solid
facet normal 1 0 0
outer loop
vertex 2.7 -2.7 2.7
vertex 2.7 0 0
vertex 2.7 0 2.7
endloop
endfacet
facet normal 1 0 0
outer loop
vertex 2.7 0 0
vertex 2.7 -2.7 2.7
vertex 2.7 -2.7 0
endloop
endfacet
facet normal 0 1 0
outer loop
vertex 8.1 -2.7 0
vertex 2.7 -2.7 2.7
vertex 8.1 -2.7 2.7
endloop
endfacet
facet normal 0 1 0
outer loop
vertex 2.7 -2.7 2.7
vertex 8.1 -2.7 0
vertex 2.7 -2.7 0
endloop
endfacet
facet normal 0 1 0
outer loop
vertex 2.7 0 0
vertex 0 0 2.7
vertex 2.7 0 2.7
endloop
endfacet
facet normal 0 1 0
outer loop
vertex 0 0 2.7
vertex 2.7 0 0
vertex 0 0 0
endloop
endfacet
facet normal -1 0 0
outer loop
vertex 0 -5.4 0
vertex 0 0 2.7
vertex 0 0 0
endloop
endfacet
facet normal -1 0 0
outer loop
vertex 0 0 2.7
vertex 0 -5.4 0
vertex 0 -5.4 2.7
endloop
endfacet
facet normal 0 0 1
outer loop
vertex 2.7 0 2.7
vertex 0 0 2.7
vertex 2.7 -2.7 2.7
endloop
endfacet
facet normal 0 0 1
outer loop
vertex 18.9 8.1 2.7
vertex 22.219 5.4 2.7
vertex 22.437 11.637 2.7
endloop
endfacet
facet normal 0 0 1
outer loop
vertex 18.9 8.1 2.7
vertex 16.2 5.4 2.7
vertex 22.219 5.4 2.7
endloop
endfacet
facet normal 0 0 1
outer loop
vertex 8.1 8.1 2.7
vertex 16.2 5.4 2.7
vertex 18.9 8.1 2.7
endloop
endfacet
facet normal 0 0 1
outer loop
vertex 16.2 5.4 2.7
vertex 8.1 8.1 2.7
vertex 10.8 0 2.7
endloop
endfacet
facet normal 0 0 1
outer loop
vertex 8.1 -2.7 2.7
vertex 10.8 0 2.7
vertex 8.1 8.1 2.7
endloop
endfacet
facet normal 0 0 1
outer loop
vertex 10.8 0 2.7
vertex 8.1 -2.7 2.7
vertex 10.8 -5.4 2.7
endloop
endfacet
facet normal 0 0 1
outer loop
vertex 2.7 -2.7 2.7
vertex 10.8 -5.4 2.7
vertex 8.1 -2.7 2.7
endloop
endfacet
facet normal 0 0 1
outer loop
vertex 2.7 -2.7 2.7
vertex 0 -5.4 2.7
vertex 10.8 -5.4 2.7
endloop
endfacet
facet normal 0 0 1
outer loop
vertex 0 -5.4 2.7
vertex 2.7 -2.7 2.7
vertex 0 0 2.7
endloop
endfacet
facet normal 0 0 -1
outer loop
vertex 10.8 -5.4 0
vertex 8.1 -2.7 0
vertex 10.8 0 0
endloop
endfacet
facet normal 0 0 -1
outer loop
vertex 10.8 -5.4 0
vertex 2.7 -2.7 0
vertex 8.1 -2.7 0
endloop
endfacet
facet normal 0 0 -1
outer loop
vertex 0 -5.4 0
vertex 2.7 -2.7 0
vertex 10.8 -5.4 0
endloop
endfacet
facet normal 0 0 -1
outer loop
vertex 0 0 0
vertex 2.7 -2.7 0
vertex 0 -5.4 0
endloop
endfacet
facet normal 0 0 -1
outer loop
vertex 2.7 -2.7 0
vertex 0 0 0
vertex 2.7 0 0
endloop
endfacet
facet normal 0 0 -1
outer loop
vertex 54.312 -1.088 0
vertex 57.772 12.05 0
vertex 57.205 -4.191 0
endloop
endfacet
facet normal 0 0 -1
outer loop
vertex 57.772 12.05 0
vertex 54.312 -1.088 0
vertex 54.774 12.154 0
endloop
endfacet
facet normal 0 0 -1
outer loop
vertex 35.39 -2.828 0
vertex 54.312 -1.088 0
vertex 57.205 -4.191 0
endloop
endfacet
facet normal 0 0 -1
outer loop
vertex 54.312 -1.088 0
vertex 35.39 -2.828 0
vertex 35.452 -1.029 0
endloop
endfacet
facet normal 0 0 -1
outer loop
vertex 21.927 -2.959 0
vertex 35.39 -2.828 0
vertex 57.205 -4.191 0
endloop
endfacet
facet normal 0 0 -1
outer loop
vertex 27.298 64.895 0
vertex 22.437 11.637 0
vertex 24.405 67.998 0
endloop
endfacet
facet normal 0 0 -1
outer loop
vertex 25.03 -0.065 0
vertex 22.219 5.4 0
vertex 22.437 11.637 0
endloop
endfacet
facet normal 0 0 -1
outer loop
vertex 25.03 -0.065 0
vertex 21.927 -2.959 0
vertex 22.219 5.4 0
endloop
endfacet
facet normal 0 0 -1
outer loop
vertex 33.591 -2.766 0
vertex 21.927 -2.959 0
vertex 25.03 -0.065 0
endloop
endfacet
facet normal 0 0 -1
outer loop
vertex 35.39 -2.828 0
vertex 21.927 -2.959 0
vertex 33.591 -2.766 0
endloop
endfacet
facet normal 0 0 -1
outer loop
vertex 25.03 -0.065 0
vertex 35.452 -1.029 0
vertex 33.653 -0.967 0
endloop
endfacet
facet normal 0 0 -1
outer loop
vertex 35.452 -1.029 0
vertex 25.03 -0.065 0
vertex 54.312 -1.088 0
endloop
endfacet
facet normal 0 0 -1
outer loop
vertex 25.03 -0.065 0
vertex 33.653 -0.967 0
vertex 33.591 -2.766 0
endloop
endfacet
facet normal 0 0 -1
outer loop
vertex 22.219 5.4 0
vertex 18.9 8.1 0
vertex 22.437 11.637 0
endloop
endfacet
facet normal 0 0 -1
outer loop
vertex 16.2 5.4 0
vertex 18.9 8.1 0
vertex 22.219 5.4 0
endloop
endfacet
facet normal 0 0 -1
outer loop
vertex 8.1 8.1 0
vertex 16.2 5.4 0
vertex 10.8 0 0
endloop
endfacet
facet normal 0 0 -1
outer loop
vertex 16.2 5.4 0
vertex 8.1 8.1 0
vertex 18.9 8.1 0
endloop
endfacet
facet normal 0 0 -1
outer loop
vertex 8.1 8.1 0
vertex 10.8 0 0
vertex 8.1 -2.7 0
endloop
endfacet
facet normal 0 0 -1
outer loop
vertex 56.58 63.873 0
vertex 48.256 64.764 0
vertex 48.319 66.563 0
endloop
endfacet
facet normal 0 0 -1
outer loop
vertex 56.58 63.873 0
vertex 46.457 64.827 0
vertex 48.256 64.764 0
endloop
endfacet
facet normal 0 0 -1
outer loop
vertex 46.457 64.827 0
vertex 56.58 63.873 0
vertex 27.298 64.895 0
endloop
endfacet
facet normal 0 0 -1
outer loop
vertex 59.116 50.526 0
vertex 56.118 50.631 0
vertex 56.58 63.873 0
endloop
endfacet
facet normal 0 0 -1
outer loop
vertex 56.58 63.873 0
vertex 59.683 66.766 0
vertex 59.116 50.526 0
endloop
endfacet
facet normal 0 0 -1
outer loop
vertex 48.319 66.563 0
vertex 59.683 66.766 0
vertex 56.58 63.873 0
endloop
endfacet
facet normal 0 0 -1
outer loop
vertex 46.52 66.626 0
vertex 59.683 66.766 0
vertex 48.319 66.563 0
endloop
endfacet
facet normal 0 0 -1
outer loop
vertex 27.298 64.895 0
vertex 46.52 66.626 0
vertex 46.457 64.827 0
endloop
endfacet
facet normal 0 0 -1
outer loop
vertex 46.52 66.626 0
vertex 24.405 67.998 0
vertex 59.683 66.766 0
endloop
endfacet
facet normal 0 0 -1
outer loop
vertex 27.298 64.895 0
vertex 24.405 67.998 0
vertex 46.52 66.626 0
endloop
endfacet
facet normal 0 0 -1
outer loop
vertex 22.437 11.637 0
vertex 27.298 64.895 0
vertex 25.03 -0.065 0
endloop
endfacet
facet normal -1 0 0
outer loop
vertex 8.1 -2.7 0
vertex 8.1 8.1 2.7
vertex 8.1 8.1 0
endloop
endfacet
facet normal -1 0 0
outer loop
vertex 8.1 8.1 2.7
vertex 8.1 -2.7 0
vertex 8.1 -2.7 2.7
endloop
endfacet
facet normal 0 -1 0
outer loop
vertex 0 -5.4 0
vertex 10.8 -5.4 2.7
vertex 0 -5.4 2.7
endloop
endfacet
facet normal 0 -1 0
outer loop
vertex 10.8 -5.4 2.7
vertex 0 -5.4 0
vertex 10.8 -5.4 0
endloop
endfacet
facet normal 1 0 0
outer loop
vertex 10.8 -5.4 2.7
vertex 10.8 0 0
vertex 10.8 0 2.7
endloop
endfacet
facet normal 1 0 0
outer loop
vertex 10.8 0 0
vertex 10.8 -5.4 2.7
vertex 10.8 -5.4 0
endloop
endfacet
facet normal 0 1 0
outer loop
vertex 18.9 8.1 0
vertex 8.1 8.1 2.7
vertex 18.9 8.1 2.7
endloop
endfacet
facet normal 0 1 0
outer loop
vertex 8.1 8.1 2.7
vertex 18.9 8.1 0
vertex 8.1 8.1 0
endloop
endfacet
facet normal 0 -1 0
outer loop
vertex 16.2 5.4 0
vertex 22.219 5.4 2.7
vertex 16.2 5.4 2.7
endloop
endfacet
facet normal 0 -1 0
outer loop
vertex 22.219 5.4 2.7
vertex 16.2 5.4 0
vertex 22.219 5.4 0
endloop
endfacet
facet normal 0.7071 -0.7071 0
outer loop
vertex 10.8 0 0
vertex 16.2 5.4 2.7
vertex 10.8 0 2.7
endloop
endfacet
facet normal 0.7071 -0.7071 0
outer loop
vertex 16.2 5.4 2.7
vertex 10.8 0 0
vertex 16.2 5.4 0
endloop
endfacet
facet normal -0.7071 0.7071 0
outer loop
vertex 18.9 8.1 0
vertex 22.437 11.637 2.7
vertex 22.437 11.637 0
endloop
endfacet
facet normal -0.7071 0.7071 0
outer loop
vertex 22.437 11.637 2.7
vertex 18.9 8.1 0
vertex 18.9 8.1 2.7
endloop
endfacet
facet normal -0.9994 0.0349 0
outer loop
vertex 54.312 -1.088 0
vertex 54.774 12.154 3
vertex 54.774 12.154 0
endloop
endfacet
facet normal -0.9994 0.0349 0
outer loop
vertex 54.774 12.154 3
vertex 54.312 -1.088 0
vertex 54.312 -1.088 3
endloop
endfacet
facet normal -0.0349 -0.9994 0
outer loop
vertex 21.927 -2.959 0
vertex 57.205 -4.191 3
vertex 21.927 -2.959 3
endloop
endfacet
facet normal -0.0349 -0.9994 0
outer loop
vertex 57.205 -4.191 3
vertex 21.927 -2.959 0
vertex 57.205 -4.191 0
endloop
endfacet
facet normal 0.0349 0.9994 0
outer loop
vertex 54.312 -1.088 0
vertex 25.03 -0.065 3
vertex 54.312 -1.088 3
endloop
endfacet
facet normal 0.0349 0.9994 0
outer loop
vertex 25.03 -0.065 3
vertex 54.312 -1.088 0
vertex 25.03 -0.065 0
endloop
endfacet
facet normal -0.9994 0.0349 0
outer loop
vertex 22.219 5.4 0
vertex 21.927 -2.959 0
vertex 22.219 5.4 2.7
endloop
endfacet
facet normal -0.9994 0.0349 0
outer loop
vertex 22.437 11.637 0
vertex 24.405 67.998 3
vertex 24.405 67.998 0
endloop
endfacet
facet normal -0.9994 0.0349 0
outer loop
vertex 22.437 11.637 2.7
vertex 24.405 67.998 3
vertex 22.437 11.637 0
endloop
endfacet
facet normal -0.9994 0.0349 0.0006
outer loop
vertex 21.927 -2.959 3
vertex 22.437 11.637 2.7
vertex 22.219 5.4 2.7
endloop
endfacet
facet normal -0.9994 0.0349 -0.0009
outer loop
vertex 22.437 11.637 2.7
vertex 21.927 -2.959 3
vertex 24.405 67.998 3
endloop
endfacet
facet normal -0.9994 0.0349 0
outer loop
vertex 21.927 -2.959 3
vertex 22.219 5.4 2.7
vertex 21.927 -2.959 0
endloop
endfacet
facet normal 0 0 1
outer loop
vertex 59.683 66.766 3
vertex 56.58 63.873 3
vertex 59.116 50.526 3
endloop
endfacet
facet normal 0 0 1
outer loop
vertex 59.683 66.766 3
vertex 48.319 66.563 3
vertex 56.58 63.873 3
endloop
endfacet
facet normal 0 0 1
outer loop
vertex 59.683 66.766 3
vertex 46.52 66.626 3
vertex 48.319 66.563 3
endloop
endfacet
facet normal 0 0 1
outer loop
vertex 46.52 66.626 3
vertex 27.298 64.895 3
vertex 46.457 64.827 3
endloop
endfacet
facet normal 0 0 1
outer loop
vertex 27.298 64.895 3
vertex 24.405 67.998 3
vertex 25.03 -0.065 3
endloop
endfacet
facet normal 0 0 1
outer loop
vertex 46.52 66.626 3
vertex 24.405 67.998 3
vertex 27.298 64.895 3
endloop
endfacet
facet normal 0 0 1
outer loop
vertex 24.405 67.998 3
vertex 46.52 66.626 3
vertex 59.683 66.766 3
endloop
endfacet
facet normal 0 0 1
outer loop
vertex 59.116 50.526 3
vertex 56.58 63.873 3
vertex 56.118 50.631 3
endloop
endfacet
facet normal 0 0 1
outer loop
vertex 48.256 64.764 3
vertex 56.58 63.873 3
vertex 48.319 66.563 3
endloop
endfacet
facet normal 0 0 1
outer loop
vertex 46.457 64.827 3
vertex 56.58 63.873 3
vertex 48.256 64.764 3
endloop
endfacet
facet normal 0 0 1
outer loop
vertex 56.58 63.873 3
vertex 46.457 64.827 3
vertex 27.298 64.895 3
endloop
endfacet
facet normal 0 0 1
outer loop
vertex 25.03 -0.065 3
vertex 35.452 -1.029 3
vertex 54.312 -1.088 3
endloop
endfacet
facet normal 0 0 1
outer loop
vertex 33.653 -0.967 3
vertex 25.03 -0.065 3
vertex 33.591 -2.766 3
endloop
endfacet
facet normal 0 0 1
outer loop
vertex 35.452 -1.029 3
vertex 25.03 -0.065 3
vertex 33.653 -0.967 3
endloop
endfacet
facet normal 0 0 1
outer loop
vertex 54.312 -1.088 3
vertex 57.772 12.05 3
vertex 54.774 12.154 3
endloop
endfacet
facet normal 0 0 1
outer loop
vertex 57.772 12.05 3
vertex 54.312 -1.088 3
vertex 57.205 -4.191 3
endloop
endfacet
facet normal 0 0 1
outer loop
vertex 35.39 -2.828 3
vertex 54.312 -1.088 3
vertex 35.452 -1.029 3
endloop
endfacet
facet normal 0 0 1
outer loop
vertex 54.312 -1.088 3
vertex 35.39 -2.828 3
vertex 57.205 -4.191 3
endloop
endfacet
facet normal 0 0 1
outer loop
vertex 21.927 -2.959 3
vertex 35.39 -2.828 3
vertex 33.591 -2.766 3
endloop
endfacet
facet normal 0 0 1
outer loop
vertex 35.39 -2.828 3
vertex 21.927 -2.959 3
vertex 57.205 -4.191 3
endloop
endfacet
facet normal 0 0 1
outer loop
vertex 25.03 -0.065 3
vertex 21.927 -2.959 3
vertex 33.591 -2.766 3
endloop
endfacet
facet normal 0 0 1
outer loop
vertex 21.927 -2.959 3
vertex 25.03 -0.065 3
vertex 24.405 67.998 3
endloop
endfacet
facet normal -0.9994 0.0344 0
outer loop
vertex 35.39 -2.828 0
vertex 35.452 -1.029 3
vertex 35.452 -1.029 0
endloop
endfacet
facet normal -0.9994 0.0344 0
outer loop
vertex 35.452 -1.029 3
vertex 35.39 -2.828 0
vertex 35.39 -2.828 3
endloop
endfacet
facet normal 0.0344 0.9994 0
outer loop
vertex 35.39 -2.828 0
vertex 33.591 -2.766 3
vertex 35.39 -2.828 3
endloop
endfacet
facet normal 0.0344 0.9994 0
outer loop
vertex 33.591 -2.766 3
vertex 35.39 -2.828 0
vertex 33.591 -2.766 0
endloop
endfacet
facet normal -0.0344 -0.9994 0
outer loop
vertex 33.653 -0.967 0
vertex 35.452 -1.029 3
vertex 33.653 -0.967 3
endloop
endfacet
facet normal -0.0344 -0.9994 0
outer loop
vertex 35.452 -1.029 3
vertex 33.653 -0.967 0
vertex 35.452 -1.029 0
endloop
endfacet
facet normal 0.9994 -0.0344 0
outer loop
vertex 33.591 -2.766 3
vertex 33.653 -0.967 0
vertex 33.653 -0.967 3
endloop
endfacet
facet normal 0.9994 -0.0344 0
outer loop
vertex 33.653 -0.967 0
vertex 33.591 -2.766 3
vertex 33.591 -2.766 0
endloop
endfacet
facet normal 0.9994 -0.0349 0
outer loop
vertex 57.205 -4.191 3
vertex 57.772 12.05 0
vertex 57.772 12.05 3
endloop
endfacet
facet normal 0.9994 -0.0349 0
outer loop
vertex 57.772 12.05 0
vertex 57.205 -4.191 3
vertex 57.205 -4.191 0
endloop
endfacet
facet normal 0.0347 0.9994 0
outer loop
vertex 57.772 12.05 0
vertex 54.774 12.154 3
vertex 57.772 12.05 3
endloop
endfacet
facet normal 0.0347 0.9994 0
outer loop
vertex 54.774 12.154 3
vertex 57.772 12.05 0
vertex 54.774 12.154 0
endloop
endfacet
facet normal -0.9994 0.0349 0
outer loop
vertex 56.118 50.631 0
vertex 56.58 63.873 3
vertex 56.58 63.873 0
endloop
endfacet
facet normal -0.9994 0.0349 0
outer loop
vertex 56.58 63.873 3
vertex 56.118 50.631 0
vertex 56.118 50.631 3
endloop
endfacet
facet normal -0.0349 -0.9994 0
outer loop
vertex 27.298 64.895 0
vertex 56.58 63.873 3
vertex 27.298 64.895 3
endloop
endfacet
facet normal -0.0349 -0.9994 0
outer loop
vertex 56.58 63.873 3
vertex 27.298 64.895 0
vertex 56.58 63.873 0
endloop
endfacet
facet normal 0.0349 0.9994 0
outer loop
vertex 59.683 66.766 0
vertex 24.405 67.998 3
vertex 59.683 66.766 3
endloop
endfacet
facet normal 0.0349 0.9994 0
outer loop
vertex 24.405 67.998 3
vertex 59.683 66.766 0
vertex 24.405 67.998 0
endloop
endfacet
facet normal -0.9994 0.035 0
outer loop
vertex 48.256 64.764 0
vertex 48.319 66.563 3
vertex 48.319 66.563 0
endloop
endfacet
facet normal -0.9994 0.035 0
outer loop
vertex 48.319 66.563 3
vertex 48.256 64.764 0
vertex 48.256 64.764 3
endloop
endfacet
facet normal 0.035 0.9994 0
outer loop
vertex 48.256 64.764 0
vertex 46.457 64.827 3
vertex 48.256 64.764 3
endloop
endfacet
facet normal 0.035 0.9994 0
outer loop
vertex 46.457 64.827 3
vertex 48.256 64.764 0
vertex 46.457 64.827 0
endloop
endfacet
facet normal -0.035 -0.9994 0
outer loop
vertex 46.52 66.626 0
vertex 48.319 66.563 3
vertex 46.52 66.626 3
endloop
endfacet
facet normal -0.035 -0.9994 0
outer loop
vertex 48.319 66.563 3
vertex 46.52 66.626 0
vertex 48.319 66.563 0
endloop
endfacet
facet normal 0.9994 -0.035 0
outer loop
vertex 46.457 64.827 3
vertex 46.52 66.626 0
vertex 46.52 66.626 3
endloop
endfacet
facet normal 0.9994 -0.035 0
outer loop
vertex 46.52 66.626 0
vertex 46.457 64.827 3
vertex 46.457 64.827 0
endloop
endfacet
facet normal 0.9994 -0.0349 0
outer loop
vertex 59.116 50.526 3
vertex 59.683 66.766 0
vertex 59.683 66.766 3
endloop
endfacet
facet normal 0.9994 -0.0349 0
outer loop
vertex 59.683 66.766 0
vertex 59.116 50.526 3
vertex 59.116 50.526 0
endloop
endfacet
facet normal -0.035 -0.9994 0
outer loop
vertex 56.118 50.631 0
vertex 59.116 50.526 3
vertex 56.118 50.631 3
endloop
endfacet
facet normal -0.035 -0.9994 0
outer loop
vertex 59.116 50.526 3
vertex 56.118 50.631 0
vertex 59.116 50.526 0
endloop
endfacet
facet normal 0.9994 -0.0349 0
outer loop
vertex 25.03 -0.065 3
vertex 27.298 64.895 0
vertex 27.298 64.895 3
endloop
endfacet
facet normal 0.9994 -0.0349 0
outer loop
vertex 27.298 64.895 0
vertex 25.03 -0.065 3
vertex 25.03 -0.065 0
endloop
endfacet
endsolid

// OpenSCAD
/*
Version 1.00 - 17/04/26
holder for raspberry on Samsung-TV with short USB-Power-Cabel on ventilation slots

***
New features in 1.10:
    input the modifikation for pi 2/3 or pi zero;
    change pi_type for select
***


### mod2509 ####################
### http://www.masterofdorn.de #
################################
*/

//create=1 create holder; create=2 create holder quarrection
create=1;

// pi_type=1 pi2/3; pi_type=2 pi zero
pi_type = 1;

samsung_slots = 3;
holder_thick = 3;
holder_samsung_thick=holder_thick-(holder_thick/10);


//pi Box-Setting
pi_width = pi_type == 1 ? 65: 72;
pi_height = pi_type == 1 ? 29.3 : 11;
pi_length = pi_type == 1? 90:35;
holder_quarrection_length = pi_type == 1?17*samsung_slots:5*samsung_slots; //muss be a multiplication of samsung_slots and muss be a odd number
holder_pi_poor_rotation=-2;

$fn=100;

module holder_samsung(){
    cube(holder_samsung_thick);
    translate([0,0,holder_samsung_thick])
    cube([holder_samsung_thick*3,holder_samsung_thick,holder_samsung_thick]);
    translate([holder_samsung_thick*3,0,-holder_samsung_thick*3])
    cube([holder_samsung_thick,holder_samsung_thick,holder_samsung_thick*5]);
    translate([holder_samsung_thick*4,0,-holder_samsung_thick*3,])
    cube([holder_samsung_thick*5,holder_samsung_thick,holder_samsung_thick]);
    translate([holder_samsung_thick*4,holder_samsung_thick/2,0])
    mirror([0,0,1]) holder_strengthening();
    translate([holder_samsung_thick*9,holder_samsung_thick/2,-holder_samsung_thick*5])
    mirror([1,0,0]) holder_strengthening();
}

module holder_pi_poor(){
    cube([holder_thick,holder_thick,pi_width]);
    translate([0,0,pi_width]){
        difference(){
            cube([pi_height+holder_thick,holder_thick,holder_thick]);
            translate([(pi_height-holder_thick*2)/2,0,holder_thick/5])
            cube([holder_thick-(2*(holder_thick/5)),holder_thick,holder_thick-(2*(holder_thick/5))]);
        }
        translate([pi_height+holder_thick,0,-(pi_width/4)+holder_thick])
        cube([holder_thick,holder_thick,pi_width/4]);
    }
    translate([0,0,-holder_thick]){
        difference(){
            cube([pi_height+holder_thick,holder_thick,holder_thick]);
            translate([(pi_height+(holder_thick*5))/2,0,holder_thick/5])
            cube([holder_thick-(2*(holder_thick/5)),holder_thick,holder_thick-(2*(holder_thick/5))]);
        }
        translate([pi_height+holder_thick,0,0])
        cube([holder_thick,holder_thick,pi_width/4]);
    }
}

echo("holder_quarrection_length=",holder_quarrection_length);
echo("holder_samsung_thick=",holder_thick-(holder_thick/10));

module holder_strengthening(){
    x=0;
    y=holder_samsung_thick/2;
    z=holder_samsung_thick*2;
    polyhedron ( points = [[0, -y, z], [0, y, z], [0, y, 0], [0, -y, 0], [z, -y, z], [z, y, z]], 
    faces = [[0,3,2], [0,2,1], [3,0,4], [1,2,5], [0,5,4], [0,1,5],  [5,2,4], [4,2,3], ]);
}

module holder_quarrection(){
    tol=0.2; 
    echo("holder_quarrection_thick=",holder_thick-(2*(holder_thick/5))-tol);
    echo("holder_quarrection_length",holder_quarrection_length+(holder_thick*2));
    cube([holder_thick-(2*(holder_thick/5))-tol,holder_quarrection_length+(holder_thick*2),holder_thick-(2*(holder_thick/5))-tol],center=true);
}

rotate(a=90,v=[1,0,0])
if (create==1){
    holder_samsung();
    translate([holder_samsung_thick*9,0,-pi_width])
    rotate(a=holder_pi_poor_rotation, v=[0,1,0]) holder_pi_poor();
}

if (create==2){
    holder_quarrection();
}

if (create==0){
    cube([holder_samsung_thick*3,holder_samsung_thick,holder_samsung_thick]);
}
